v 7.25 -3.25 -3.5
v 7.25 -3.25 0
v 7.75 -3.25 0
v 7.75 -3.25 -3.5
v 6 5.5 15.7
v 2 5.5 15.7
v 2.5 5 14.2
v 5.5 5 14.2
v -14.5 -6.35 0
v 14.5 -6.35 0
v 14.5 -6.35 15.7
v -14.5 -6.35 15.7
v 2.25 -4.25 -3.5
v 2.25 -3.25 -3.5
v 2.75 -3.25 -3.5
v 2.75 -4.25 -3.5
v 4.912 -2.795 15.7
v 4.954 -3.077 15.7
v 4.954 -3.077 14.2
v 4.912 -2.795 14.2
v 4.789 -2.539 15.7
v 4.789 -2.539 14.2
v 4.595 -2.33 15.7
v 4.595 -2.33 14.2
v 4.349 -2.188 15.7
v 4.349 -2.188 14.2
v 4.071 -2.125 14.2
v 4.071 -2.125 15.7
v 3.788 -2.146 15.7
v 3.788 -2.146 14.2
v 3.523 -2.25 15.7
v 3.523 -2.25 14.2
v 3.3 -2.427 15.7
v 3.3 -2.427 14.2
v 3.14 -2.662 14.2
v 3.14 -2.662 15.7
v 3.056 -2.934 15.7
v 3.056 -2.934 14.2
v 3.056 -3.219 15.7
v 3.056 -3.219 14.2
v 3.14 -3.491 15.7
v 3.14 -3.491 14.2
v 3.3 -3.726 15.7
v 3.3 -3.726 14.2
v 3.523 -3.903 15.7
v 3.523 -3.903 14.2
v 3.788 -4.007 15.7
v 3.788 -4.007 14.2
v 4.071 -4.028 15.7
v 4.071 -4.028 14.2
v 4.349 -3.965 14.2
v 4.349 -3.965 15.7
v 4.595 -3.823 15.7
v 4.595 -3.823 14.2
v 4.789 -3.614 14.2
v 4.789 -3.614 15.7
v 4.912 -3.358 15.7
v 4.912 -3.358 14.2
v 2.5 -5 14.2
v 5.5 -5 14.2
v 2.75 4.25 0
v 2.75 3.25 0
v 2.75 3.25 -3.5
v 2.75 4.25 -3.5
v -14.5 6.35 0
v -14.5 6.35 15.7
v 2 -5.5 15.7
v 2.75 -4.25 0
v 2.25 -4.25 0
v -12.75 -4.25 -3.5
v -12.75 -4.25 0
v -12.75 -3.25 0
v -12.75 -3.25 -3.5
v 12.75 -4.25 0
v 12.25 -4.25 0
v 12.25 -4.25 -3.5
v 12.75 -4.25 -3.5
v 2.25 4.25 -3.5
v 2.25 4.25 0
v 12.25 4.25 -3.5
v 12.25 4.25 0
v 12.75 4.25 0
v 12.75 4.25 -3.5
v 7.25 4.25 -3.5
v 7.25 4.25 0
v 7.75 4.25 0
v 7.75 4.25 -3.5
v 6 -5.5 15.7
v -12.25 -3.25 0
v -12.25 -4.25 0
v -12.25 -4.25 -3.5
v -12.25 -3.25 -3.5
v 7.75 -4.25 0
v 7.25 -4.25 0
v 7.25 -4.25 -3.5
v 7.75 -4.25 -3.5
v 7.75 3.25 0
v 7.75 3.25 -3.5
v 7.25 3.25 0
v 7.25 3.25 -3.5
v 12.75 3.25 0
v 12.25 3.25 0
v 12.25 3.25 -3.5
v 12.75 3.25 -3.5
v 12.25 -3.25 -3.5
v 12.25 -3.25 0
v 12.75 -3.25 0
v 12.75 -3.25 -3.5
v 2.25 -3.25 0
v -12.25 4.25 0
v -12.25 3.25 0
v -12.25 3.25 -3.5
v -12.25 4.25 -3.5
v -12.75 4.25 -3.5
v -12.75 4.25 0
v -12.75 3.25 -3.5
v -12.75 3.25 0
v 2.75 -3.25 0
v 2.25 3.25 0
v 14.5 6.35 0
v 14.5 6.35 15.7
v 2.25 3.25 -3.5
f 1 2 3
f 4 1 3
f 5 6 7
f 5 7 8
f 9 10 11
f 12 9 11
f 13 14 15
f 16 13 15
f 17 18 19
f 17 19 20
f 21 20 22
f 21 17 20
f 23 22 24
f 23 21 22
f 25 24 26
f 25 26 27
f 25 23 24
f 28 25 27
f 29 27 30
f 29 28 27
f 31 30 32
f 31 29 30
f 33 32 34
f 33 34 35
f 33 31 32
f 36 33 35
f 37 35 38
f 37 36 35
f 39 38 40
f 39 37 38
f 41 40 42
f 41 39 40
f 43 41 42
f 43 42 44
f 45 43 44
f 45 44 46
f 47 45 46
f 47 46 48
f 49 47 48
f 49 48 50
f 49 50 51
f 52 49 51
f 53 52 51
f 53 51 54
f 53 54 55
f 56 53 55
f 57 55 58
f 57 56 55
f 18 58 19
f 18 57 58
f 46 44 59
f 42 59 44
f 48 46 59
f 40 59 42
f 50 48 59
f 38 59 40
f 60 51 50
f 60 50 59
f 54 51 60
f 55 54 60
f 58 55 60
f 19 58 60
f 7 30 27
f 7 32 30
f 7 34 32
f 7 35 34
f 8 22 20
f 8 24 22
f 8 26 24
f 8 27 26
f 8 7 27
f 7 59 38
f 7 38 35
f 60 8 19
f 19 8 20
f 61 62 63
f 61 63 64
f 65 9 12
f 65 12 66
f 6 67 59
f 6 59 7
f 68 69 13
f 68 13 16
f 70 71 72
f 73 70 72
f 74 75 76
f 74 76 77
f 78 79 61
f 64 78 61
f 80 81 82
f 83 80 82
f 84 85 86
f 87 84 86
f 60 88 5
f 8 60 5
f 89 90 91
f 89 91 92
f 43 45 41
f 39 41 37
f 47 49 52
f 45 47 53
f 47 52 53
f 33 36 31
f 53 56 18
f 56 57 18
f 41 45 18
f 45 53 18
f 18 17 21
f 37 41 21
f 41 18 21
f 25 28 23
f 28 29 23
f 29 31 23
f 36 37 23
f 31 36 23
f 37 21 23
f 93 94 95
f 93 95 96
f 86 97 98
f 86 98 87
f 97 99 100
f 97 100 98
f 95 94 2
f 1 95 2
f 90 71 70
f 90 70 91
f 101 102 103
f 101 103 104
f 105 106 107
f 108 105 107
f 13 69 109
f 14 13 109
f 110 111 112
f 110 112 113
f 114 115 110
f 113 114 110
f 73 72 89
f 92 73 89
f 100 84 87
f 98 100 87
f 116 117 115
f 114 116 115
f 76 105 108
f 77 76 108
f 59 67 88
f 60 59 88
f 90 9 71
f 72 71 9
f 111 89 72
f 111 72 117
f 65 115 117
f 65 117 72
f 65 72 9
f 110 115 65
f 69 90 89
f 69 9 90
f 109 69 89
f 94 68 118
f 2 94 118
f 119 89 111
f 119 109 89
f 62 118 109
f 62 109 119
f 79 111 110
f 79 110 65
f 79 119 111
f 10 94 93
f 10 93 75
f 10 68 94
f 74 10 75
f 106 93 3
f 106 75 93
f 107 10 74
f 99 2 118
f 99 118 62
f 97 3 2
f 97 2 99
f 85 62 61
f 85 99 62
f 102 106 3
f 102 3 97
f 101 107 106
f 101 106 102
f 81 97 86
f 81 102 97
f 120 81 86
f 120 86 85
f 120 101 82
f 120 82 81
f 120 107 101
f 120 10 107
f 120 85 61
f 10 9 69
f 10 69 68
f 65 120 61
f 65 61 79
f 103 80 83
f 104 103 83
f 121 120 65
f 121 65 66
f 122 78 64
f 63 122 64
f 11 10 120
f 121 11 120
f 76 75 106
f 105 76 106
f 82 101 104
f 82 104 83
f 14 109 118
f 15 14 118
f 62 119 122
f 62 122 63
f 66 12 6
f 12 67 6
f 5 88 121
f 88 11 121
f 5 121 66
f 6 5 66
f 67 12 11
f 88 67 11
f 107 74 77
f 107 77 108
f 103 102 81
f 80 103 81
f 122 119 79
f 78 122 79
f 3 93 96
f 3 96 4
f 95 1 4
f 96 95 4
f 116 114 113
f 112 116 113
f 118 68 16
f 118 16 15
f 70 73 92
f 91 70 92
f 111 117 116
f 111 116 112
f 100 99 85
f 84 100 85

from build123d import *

# Parameters (mm, degrees)
F0_W     = 12.7
F0_H     = 15.7
F1_DEPTH = 14.5
F2_W     = 0.5
F2_H     = 1
F3_DEPTH = 3.5
F4_W     = 4
F4_H     = 11
F4_R     = 0.9543570249
F5_DEPTH = 1.5
F6_SIZE2 = 1.49999
F6_SIZE  = 0.49999


# Not quite as in the source:
# - a fillet or chamfer is up to 0.001 mm smaller than in the source, because OpenCascade refuses the exact size


with BuildPart() as f1:
    # F0 (on Right) → F1 (new body, symmetric)
    with BuildSketch(Plane.YZ):
        with Locations((0, 7.85)):
            Rectangle(F0_W, F0_H)
    extrude(amount=F1_DEPTH, both=True)

    # F2 (on Top) → F3 (join)
    with BuildSketch(Plane.XY):
        with Locations((-12.5, 3.75)):
            Rectangle(F2_W, F2_H)
        with Locations((2.5, 3.75)):
            Rectangle(F2_W, F2_H)
        with Locations((7.5, 3.75)):
            Rectangle(F2_W, F2_H)
        with Locations((12.5, 3.75)):
            Rectangle(F2_W, F2_H)
        with Locations((2.5, -3.75)):
            Rectangle(F2_W, F2_H)
        with Locations((7.5, -3.75)):
            Rectangle(F2_W, F2_H)
        with Locations((12.5, -3.75)):
            Rectangle(F2_W, F2_H)
        with Locations((-12.5, -3.75)):
            Rectangle(F2_W, F2_H)
    extrude(amount=-F3_DEPTH)

    # F4 (on face) → F5 (cut)
    with BuildSketch(Plane.XY.offset(15.7)):
        with Locations((4, 0)):
            Rectangle(F4_W, F4_H)
        with Locations((4, -3.076559362)):
            Circle(F4_R, mode=Mode.SUBTRACT)
    extrude(amount=-F5_DEPTH, mode=Mode.SUBTRACT)

    # F6 (size 0.5 and 1.5 in the source; OpenCascade refuses exactly that, so slightly less here)
    f6_edges = [f1.edges().sort_by_distance(p)[0] for p in [
        (2, 0, 14.2),
        (4, 5.5, 14.2),
        (6, 0, 14.2),
        (4, -5.5, 14.2),
    ]]
    f6_side = f1.faces().sort_by_distance((4, 0.213987, 14.2))[0]
    chamfer(f6_edges, length=F6_SIZE, length2=F6_SIZE2, reference=f6_side)


solid = f1.part
